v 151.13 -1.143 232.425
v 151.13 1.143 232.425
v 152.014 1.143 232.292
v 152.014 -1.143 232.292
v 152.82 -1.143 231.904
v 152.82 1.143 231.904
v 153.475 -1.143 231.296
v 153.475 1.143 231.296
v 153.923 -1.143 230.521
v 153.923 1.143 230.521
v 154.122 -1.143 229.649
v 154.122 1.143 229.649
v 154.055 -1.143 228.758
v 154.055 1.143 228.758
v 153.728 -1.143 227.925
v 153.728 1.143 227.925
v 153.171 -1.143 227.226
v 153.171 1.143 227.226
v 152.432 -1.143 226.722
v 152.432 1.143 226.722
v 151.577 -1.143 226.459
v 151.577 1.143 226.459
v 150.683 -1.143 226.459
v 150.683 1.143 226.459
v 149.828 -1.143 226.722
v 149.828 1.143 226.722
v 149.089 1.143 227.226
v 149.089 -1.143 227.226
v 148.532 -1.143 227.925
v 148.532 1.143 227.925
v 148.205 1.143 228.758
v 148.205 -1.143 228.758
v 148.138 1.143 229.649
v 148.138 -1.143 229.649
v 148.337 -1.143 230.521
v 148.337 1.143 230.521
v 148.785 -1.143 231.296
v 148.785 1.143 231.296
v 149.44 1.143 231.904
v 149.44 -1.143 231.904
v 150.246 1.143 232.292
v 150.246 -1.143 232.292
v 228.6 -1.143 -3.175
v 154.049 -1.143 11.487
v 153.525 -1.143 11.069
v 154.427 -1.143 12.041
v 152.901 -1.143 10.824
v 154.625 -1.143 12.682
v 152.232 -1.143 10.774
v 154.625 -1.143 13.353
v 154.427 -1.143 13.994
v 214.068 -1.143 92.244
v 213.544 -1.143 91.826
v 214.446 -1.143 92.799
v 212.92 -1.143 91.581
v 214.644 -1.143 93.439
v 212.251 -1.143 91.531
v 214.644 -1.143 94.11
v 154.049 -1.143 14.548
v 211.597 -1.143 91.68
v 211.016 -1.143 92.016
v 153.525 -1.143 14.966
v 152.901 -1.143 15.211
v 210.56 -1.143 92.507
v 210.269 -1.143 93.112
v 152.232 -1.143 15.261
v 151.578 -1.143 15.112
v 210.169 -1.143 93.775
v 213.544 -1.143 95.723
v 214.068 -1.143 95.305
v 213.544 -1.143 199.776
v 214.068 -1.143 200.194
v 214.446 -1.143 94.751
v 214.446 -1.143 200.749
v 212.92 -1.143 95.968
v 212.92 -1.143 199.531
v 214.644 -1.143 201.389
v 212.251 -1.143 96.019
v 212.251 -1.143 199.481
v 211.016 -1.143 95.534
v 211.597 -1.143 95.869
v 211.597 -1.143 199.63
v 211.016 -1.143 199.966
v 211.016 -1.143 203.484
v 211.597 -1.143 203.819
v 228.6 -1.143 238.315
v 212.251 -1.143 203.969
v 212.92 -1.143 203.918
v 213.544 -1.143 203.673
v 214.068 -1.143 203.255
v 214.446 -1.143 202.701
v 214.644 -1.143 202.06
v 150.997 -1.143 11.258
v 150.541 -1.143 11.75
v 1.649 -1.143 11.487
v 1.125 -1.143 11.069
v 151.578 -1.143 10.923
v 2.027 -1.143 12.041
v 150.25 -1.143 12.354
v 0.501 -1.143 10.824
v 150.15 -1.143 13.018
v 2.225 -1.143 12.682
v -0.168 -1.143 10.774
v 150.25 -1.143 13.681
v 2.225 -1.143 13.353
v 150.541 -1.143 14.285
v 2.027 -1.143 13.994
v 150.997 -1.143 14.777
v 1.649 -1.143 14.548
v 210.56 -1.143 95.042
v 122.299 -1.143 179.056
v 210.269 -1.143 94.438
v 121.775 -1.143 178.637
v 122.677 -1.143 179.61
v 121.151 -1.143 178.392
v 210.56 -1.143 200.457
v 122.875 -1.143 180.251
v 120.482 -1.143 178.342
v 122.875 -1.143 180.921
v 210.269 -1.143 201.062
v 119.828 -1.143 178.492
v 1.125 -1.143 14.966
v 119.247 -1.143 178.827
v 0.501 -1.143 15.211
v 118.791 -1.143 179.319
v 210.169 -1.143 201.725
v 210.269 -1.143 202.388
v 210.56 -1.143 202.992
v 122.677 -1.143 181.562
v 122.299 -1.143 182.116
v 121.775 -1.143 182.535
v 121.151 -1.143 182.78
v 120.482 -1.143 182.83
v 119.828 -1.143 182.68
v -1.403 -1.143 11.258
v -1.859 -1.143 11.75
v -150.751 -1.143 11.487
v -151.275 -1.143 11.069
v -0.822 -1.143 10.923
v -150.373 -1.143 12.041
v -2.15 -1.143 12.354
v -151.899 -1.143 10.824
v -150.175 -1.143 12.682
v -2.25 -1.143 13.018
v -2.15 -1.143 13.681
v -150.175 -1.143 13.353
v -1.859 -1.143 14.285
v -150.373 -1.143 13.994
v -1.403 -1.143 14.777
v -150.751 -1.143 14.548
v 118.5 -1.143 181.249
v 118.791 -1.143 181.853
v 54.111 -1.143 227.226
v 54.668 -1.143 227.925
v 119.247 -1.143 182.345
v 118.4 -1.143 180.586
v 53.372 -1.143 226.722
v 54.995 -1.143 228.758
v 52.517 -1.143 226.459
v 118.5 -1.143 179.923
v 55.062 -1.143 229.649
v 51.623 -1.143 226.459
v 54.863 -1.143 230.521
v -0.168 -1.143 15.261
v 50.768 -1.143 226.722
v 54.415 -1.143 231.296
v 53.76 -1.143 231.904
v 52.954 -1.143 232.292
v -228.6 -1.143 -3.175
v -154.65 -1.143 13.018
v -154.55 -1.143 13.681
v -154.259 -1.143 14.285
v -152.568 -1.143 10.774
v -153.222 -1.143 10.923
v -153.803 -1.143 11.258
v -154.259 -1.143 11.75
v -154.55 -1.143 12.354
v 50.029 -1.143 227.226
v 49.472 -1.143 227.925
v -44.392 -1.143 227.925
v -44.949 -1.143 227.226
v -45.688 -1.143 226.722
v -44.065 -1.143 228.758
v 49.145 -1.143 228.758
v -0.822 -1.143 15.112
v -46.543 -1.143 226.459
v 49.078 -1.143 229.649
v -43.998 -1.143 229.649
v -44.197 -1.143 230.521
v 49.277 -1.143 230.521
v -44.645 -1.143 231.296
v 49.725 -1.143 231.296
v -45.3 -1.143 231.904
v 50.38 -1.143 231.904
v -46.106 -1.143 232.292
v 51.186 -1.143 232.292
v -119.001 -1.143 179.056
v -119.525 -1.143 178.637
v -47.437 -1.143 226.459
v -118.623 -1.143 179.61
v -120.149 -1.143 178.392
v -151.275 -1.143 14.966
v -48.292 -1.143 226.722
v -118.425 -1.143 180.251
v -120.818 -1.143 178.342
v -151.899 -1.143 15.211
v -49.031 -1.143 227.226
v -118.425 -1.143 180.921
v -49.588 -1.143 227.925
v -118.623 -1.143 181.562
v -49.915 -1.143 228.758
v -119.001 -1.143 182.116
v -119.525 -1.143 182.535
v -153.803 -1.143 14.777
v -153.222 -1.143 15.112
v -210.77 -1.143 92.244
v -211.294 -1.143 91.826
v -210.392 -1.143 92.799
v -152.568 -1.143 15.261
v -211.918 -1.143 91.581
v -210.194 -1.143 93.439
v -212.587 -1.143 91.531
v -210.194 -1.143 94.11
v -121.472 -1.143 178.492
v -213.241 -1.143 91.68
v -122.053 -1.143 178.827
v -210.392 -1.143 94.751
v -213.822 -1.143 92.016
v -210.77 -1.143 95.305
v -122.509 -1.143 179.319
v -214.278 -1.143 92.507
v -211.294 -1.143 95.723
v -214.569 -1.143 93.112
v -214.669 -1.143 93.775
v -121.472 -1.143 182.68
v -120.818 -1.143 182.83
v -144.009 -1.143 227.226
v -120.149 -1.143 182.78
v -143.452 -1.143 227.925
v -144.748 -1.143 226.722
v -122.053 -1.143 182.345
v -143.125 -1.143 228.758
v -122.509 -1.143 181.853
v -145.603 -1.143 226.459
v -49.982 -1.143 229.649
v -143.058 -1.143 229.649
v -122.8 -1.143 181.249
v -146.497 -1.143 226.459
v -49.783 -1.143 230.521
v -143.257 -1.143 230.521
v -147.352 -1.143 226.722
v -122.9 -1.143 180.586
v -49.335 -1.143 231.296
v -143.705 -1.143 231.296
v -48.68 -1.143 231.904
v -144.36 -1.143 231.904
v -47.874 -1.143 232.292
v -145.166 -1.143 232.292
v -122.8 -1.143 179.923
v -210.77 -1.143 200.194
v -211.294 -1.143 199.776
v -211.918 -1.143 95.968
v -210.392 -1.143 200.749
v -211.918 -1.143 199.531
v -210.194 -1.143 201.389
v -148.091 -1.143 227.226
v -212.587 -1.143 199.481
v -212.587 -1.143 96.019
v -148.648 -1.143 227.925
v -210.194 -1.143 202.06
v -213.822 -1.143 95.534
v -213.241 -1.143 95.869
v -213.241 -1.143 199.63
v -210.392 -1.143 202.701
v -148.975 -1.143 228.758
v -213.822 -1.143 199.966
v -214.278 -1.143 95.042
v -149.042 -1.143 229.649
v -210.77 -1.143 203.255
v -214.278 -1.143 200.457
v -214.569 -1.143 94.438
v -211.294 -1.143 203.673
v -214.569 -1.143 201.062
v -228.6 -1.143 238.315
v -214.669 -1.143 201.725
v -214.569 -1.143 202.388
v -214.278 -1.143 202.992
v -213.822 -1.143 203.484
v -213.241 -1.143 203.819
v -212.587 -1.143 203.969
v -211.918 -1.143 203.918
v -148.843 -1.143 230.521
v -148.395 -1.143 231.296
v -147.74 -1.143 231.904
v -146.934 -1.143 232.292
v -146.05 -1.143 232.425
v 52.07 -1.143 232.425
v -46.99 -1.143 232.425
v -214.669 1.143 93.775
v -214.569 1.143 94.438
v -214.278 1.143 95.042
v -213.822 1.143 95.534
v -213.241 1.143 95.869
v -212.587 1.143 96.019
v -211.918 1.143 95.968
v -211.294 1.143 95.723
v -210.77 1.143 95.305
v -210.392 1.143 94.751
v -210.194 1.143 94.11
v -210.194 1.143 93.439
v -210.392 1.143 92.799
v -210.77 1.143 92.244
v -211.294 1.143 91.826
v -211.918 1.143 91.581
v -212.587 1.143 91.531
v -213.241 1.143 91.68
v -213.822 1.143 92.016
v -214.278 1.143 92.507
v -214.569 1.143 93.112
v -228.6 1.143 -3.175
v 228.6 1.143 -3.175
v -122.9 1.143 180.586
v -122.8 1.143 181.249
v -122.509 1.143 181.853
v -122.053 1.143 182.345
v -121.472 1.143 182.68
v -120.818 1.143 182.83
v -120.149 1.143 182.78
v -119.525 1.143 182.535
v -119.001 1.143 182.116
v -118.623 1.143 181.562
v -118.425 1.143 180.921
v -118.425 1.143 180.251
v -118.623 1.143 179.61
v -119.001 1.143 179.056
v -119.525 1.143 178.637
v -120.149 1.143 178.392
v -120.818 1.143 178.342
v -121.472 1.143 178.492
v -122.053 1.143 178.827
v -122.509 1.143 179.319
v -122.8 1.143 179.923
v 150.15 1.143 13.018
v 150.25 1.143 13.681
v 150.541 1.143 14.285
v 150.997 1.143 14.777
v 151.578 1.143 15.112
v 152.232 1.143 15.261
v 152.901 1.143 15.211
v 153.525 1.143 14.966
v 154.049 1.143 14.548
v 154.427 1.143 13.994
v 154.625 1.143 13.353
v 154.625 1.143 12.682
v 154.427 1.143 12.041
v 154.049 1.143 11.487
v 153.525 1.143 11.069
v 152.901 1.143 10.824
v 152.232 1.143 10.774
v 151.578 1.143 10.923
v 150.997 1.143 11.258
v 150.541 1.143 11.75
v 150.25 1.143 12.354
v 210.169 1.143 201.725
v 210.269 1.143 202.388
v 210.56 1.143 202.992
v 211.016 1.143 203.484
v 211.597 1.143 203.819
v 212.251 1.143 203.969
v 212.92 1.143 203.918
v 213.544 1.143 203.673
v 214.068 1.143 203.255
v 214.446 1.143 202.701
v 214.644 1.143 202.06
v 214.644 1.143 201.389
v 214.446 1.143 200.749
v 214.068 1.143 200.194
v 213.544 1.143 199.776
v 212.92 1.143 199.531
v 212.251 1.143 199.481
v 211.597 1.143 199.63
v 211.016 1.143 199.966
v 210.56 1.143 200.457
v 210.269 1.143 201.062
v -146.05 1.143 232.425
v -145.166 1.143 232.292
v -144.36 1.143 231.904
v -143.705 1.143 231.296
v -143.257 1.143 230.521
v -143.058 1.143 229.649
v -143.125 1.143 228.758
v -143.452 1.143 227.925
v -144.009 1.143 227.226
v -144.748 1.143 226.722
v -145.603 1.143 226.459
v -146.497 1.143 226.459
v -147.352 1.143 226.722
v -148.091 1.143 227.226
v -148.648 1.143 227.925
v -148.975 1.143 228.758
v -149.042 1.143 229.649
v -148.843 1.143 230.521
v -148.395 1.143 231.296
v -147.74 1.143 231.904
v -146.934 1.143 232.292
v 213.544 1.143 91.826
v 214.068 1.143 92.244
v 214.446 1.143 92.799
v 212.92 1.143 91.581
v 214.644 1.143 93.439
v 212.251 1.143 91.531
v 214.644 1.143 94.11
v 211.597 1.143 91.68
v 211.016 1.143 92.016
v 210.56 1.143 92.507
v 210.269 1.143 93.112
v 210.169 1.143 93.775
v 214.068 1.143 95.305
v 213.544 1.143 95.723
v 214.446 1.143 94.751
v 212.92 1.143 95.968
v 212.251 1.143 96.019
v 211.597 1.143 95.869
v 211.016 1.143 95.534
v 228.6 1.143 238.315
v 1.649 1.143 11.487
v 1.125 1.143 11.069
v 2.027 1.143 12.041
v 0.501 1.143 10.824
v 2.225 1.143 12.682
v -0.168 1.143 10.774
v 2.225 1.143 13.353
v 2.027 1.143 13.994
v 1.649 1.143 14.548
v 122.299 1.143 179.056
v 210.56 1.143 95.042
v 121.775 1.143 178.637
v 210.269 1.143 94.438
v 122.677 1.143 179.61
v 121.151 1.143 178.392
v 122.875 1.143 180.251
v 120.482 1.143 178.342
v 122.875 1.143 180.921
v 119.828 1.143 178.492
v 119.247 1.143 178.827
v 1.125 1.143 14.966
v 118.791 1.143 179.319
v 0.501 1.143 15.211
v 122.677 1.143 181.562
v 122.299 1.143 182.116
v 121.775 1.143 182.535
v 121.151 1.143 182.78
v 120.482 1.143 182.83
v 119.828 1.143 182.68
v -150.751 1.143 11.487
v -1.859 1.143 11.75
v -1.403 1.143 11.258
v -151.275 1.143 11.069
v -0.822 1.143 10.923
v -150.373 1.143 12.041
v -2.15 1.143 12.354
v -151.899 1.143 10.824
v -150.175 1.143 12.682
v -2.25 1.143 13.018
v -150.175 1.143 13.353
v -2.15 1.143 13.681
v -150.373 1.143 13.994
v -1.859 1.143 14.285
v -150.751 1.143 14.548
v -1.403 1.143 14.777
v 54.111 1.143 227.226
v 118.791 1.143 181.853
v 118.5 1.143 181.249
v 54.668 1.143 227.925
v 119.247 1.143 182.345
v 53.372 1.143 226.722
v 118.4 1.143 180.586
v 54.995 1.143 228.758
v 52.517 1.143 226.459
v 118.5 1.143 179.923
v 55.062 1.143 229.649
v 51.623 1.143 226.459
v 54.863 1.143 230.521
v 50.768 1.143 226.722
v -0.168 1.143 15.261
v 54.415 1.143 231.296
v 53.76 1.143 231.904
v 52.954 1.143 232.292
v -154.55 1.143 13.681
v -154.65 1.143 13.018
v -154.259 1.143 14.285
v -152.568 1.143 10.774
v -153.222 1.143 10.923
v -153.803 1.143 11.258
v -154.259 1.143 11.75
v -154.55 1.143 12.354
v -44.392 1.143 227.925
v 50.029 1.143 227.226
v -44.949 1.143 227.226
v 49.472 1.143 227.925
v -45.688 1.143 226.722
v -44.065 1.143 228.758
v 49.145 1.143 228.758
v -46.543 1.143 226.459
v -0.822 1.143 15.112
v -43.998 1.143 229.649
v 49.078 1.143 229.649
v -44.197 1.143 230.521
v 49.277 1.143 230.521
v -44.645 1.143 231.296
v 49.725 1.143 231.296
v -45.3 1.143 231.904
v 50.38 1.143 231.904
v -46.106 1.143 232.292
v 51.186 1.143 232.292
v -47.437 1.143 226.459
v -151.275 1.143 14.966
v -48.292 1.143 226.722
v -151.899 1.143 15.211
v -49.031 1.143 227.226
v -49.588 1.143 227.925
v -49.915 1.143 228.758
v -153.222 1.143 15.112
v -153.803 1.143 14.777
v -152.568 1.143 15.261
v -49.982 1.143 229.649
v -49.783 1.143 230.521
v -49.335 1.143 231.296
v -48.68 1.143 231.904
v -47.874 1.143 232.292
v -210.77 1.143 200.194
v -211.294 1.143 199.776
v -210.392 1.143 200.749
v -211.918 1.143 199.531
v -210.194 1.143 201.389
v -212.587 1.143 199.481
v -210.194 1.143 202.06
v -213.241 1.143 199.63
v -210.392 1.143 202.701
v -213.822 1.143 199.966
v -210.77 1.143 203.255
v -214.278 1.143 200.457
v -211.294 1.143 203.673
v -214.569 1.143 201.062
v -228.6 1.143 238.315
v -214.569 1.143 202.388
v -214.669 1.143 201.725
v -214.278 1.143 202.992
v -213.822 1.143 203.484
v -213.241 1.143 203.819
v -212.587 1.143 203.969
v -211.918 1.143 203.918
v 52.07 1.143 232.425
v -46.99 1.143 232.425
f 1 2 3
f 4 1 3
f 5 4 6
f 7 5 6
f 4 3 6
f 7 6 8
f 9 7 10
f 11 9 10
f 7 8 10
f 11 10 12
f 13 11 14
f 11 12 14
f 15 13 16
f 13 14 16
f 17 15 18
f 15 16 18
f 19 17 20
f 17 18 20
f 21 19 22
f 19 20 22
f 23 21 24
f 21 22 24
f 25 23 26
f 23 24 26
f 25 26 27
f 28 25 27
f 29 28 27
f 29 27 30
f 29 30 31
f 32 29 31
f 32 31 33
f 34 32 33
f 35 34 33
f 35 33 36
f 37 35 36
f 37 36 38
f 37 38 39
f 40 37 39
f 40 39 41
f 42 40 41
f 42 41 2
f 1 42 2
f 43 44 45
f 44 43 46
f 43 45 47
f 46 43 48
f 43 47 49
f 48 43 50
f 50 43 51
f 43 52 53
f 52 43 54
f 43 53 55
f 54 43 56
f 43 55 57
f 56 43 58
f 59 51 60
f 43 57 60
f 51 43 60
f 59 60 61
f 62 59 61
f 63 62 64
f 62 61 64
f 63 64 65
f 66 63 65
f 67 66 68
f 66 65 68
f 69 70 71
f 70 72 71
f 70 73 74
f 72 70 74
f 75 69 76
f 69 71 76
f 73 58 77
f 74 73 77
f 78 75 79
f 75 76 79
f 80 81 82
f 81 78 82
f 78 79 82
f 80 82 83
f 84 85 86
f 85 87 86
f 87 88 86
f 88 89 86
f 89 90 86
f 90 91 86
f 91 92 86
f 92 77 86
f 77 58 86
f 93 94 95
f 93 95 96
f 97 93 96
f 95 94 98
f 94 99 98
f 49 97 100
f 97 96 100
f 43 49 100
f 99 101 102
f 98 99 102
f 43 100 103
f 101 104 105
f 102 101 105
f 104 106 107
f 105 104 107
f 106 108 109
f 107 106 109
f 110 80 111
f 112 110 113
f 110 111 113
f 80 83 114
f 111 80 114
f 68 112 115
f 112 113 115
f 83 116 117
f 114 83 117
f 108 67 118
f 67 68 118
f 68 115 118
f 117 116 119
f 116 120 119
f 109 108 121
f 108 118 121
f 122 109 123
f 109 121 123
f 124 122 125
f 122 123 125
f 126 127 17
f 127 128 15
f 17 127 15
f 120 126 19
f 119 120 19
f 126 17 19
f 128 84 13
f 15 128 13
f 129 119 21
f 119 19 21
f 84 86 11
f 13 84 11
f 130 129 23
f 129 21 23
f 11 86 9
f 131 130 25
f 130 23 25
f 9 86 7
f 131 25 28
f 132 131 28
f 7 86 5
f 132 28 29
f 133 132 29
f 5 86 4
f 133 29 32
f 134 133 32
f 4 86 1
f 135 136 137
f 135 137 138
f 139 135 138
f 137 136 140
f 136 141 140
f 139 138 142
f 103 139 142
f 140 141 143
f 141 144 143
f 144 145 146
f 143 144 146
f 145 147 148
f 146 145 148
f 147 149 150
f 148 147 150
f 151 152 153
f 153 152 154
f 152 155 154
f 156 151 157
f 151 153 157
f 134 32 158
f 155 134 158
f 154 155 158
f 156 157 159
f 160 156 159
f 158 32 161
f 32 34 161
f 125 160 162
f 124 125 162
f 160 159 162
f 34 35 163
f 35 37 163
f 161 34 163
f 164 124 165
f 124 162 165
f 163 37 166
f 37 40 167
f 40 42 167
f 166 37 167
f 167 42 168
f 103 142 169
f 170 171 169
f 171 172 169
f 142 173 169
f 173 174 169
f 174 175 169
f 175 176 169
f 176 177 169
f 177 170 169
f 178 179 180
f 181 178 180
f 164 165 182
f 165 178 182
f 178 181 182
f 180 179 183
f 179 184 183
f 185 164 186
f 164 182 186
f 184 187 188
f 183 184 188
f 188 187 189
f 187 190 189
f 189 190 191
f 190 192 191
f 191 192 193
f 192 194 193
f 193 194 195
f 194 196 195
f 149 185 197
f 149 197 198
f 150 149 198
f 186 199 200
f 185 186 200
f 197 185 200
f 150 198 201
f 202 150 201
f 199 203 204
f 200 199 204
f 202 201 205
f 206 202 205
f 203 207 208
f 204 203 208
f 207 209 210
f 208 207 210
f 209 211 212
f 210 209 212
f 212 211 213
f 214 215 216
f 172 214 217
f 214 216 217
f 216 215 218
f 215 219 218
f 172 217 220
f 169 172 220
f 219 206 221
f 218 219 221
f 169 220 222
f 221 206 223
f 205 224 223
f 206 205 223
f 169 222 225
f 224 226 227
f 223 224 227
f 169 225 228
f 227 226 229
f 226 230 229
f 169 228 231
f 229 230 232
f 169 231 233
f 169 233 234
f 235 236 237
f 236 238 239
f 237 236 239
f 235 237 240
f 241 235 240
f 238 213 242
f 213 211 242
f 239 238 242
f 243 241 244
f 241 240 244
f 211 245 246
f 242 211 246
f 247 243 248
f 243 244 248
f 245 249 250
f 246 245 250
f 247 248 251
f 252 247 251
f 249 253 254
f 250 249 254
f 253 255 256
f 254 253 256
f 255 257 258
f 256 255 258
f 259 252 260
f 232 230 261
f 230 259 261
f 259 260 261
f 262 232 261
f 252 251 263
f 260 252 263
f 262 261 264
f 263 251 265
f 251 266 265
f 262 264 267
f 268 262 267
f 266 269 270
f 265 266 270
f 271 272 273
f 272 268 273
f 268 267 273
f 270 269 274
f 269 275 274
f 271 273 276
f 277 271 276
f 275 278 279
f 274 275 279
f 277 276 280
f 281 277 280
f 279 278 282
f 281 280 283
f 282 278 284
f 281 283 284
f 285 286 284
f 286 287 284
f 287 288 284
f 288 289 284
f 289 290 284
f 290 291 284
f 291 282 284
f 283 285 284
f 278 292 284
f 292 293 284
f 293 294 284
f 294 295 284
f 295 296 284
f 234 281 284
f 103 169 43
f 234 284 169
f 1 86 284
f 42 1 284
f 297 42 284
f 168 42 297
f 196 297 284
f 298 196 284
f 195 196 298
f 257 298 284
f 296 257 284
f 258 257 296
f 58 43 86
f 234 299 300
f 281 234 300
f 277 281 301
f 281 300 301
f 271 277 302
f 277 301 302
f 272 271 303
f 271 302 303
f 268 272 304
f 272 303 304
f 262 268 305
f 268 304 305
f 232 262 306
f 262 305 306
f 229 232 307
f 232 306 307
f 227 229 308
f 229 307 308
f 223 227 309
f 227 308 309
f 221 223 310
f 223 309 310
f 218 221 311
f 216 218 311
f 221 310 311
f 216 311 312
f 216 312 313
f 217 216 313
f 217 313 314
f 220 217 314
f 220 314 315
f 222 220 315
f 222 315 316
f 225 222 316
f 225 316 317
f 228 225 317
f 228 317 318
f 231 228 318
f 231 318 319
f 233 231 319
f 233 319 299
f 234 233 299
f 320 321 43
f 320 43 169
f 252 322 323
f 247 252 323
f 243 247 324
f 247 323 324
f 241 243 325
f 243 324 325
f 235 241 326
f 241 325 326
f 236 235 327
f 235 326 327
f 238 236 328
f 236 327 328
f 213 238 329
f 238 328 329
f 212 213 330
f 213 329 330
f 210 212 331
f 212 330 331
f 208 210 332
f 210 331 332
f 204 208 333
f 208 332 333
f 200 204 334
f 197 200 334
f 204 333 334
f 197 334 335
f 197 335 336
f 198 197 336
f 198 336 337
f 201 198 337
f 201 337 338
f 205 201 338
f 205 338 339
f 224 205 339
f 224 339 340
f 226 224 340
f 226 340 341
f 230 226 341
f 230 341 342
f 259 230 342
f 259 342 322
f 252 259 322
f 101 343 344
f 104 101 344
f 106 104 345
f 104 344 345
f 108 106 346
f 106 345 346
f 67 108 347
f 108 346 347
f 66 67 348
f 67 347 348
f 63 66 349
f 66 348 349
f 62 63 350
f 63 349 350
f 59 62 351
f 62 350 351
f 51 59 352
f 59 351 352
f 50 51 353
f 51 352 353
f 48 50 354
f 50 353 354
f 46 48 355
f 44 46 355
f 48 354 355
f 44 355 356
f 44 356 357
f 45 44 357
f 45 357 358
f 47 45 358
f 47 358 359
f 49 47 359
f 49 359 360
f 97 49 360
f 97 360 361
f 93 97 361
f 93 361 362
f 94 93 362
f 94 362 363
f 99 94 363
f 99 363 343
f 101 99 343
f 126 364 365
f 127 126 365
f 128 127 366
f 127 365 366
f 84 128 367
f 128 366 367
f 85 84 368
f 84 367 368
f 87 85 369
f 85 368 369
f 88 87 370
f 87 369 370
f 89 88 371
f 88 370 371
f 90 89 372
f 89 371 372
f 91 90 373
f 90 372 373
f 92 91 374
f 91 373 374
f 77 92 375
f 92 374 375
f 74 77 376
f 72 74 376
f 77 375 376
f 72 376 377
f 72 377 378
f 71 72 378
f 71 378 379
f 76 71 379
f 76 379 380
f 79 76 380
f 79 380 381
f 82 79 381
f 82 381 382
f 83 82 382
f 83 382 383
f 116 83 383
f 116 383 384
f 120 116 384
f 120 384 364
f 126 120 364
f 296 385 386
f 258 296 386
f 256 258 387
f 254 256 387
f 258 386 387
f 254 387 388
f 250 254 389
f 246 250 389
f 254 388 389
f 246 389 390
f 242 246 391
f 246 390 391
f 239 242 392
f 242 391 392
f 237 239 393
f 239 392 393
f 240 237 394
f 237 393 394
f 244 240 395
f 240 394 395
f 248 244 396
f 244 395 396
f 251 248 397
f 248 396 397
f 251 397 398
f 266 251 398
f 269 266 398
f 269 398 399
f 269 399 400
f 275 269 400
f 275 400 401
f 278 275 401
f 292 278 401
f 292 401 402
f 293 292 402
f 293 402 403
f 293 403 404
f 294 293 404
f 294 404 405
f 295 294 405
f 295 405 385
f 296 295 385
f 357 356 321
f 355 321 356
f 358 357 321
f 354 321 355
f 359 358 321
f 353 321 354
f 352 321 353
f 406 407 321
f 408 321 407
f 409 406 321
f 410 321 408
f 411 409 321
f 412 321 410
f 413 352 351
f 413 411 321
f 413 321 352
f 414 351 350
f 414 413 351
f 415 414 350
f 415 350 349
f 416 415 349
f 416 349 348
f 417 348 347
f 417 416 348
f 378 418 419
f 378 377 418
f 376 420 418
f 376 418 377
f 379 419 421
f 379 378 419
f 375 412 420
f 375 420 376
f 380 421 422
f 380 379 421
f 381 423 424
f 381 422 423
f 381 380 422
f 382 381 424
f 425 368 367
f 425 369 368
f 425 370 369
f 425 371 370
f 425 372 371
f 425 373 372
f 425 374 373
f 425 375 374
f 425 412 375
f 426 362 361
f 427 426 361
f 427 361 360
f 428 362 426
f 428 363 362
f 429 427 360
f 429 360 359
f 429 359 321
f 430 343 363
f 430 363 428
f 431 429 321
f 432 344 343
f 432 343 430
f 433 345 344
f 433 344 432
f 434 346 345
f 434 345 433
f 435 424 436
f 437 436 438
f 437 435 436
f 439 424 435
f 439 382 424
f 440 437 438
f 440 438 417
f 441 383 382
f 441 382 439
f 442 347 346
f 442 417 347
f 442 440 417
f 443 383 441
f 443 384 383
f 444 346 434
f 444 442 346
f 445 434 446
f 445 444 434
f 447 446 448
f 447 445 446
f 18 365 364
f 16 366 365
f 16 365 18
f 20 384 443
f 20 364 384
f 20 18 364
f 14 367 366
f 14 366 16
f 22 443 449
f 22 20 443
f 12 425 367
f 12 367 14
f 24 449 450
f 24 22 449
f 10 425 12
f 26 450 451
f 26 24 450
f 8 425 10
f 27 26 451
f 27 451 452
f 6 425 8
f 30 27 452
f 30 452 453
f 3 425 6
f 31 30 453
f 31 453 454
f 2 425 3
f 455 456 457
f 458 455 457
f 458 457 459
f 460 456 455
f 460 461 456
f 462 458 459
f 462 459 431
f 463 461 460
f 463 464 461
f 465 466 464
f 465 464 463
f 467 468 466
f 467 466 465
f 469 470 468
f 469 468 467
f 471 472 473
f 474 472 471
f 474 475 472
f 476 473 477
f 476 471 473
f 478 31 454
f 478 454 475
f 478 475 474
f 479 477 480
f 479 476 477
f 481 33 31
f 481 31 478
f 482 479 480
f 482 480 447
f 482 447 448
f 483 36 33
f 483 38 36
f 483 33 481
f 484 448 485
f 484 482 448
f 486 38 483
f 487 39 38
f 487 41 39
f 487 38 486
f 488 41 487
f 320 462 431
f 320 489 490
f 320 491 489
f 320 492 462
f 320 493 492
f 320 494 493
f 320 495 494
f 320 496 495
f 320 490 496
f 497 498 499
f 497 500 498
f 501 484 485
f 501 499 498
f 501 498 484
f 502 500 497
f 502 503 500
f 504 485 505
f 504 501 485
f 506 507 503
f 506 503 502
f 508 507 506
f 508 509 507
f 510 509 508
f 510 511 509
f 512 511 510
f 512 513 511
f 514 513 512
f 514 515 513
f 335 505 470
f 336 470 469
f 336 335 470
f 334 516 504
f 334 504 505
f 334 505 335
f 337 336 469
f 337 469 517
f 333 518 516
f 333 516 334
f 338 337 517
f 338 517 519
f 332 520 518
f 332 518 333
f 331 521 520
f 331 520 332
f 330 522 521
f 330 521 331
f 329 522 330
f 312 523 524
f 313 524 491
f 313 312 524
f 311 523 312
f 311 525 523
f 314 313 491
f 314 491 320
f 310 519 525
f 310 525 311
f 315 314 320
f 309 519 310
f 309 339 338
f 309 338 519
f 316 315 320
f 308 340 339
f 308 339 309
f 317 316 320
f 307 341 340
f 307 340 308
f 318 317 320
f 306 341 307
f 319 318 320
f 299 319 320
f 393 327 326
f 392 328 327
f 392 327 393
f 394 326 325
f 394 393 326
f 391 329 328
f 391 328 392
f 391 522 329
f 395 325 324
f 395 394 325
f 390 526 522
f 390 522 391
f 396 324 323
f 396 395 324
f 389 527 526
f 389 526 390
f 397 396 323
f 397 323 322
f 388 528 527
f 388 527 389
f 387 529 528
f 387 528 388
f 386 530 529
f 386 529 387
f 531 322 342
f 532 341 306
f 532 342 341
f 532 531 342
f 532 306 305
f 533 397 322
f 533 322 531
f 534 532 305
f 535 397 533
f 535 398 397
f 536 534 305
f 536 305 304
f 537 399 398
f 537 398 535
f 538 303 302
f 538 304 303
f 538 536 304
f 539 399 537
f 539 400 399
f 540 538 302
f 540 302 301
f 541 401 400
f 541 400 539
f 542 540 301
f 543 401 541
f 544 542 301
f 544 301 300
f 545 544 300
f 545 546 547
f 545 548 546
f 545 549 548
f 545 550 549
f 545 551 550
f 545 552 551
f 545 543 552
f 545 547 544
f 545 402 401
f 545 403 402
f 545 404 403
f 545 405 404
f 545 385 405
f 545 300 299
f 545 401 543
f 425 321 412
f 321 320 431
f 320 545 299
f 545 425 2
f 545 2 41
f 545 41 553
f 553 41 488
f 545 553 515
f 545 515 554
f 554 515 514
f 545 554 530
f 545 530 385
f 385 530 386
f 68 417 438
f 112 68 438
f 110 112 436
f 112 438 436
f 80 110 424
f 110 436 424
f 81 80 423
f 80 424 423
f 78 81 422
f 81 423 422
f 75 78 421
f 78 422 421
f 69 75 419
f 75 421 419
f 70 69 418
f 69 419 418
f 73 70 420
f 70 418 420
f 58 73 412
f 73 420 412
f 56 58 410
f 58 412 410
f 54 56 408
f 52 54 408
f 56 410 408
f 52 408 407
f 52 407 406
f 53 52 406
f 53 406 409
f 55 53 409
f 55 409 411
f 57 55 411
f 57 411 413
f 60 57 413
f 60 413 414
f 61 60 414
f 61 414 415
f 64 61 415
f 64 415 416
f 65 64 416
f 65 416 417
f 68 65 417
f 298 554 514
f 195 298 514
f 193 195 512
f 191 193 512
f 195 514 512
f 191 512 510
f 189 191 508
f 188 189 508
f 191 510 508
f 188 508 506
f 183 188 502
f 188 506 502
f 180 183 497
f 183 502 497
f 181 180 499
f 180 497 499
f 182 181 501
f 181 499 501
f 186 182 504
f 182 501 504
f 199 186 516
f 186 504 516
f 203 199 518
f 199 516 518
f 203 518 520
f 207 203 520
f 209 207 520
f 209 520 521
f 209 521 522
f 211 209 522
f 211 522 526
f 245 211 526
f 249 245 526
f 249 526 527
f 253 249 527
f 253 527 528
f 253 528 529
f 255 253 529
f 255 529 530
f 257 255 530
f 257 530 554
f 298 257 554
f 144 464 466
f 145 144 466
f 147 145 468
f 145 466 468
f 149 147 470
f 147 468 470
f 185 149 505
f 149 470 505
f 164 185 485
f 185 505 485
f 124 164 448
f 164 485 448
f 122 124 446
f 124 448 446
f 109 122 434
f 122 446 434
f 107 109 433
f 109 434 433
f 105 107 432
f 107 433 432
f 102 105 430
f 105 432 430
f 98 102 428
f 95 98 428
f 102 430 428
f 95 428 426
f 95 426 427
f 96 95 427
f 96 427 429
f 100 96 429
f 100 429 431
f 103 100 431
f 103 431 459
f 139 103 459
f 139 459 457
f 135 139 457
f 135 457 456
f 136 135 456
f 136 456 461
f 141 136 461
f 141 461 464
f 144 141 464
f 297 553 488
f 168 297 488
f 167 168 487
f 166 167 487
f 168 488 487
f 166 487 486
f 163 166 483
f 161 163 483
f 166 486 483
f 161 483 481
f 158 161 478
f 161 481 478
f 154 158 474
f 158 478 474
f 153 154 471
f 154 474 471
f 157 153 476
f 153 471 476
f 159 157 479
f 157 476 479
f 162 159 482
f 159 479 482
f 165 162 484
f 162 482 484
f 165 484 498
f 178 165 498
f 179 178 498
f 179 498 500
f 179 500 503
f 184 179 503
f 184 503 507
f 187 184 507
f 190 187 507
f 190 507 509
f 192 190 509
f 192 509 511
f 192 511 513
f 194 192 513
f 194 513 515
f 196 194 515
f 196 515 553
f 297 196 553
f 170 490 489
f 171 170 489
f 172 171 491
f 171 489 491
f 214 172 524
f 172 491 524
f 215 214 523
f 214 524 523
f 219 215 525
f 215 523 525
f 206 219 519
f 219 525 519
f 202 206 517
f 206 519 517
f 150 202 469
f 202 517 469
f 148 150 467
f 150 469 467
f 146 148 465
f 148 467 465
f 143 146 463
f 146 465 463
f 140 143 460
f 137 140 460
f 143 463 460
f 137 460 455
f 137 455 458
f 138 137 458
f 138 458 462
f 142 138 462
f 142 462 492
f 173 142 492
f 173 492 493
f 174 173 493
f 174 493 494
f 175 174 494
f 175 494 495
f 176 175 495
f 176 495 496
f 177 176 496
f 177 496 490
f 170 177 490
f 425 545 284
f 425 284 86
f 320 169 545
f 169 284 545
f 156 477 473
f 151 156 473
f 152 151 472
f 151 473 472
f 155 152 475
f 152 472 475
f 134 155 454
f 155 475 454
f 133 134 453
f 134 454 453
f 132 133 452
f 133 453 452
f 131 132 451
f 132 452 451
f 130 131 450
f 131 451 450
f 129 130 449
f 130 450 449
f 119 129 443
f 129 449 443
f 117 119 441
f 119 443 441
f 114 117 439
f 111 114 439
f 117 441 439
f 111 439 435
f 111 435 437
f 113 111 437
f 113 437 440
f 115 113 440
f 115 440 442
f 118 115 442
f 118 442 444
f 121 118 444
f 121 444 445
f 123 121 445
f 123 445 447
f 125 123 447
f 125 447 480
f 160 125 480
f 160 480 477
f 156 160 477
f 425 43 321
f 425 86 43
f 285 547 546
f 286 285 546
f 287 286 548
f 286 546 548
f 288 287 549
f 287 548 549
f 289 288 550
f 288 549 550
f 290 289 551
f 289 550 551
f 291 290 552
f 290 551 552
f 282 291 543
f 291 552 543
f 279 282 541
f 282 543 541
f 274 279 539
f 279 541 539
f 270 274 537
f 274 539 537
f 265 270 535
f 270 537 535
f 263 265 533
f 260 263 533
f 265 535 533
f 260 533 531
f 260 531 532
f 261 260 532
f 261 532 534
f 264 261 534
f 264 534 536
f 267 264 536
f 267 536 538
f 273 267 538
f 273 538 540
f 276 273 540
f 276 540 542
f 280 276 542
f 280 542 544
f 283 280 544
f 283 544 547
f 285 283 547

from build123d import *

# Parameters (mm, degrees)
SKETCH1_W            = 457.2
SKETCH1_H            = 2.286
BOSS_EXTRUDE1_DEPTH  = 238.315200026
SKETCH2_W            = 457.2
SKETCH2_H            = 2.286
BOSS_EXTRUDE2_DEPTH  = 3.175
SKETCH9_R            = 3
CUT_EXTRUDE10_DEPTH  = 2.54
LPATTERN1_COUNT      = 4
LPATTERN1_PITCH      = 99.06
M4_CLEARANCE_HOLE1_D = 4.5


with BuildPart() as part:
    # Sketch1 → Boss-Extrude1 (new body)
    with BuildSketch(Plane.XY):
        Rectangle(SKETCH1_W, SKETCH1_H)
    extrude(amount=BOSS_EXTRUDE1_DEPTH)

    # Sketch2 → Boss-Extrude2 (add)
    with BuildSketch(Plane(origin=(0, 0, 0), x_dir=(-1, 0, 0), z_dir=(0, 0, -1))):
        Rectangle(SKETCH2_W, SKETCH2_H)
    extrude(amount=BOSS_EXTRUDE2_DEPTH)

    # Sketch9 → Cut-Extrude10 (cut)
    with BuildSketch(Plane(origin=(0, 1.143, 0), x_dir=(1, 0, 0), z_dir=(0, 1, 0))):
        with Locations(Location((-146.05, -229.425200026, 0), (0, 0, 270))):
            Circle(SKETCH9_R)
    cut_extrude10 = extrude(amount=-CUT_EXTRUDE10_DEPTH, mode=Mode.SUBTRACT)

    # LPattern1: Cut-Extrude10 ×4
    with Locations(*[(i * LPATTERN1_PITCH, 0, 0) for i in range(1, LPATTERN1_COUNT)]):
        add(cut_extrude10, mode=Mode.SUBTRACT)

    # M4 Clearance Hole1 (through all)
    with Locations(Plane.XZ.offset(1.143)):
        with Locations((-212.419, 93.774823778), (-152.4, 13.0175), (0, 13.0175), (152.4, 13.0175), (212.419, 93.774823778), (212.419, 201.724823778), (120.65, 180.586), (-120.65, 180.586), (-212.419, 201.724823778)):
            Hole(M4_CLEARANCE_HOLE1_D / 2)


solid = part.part
